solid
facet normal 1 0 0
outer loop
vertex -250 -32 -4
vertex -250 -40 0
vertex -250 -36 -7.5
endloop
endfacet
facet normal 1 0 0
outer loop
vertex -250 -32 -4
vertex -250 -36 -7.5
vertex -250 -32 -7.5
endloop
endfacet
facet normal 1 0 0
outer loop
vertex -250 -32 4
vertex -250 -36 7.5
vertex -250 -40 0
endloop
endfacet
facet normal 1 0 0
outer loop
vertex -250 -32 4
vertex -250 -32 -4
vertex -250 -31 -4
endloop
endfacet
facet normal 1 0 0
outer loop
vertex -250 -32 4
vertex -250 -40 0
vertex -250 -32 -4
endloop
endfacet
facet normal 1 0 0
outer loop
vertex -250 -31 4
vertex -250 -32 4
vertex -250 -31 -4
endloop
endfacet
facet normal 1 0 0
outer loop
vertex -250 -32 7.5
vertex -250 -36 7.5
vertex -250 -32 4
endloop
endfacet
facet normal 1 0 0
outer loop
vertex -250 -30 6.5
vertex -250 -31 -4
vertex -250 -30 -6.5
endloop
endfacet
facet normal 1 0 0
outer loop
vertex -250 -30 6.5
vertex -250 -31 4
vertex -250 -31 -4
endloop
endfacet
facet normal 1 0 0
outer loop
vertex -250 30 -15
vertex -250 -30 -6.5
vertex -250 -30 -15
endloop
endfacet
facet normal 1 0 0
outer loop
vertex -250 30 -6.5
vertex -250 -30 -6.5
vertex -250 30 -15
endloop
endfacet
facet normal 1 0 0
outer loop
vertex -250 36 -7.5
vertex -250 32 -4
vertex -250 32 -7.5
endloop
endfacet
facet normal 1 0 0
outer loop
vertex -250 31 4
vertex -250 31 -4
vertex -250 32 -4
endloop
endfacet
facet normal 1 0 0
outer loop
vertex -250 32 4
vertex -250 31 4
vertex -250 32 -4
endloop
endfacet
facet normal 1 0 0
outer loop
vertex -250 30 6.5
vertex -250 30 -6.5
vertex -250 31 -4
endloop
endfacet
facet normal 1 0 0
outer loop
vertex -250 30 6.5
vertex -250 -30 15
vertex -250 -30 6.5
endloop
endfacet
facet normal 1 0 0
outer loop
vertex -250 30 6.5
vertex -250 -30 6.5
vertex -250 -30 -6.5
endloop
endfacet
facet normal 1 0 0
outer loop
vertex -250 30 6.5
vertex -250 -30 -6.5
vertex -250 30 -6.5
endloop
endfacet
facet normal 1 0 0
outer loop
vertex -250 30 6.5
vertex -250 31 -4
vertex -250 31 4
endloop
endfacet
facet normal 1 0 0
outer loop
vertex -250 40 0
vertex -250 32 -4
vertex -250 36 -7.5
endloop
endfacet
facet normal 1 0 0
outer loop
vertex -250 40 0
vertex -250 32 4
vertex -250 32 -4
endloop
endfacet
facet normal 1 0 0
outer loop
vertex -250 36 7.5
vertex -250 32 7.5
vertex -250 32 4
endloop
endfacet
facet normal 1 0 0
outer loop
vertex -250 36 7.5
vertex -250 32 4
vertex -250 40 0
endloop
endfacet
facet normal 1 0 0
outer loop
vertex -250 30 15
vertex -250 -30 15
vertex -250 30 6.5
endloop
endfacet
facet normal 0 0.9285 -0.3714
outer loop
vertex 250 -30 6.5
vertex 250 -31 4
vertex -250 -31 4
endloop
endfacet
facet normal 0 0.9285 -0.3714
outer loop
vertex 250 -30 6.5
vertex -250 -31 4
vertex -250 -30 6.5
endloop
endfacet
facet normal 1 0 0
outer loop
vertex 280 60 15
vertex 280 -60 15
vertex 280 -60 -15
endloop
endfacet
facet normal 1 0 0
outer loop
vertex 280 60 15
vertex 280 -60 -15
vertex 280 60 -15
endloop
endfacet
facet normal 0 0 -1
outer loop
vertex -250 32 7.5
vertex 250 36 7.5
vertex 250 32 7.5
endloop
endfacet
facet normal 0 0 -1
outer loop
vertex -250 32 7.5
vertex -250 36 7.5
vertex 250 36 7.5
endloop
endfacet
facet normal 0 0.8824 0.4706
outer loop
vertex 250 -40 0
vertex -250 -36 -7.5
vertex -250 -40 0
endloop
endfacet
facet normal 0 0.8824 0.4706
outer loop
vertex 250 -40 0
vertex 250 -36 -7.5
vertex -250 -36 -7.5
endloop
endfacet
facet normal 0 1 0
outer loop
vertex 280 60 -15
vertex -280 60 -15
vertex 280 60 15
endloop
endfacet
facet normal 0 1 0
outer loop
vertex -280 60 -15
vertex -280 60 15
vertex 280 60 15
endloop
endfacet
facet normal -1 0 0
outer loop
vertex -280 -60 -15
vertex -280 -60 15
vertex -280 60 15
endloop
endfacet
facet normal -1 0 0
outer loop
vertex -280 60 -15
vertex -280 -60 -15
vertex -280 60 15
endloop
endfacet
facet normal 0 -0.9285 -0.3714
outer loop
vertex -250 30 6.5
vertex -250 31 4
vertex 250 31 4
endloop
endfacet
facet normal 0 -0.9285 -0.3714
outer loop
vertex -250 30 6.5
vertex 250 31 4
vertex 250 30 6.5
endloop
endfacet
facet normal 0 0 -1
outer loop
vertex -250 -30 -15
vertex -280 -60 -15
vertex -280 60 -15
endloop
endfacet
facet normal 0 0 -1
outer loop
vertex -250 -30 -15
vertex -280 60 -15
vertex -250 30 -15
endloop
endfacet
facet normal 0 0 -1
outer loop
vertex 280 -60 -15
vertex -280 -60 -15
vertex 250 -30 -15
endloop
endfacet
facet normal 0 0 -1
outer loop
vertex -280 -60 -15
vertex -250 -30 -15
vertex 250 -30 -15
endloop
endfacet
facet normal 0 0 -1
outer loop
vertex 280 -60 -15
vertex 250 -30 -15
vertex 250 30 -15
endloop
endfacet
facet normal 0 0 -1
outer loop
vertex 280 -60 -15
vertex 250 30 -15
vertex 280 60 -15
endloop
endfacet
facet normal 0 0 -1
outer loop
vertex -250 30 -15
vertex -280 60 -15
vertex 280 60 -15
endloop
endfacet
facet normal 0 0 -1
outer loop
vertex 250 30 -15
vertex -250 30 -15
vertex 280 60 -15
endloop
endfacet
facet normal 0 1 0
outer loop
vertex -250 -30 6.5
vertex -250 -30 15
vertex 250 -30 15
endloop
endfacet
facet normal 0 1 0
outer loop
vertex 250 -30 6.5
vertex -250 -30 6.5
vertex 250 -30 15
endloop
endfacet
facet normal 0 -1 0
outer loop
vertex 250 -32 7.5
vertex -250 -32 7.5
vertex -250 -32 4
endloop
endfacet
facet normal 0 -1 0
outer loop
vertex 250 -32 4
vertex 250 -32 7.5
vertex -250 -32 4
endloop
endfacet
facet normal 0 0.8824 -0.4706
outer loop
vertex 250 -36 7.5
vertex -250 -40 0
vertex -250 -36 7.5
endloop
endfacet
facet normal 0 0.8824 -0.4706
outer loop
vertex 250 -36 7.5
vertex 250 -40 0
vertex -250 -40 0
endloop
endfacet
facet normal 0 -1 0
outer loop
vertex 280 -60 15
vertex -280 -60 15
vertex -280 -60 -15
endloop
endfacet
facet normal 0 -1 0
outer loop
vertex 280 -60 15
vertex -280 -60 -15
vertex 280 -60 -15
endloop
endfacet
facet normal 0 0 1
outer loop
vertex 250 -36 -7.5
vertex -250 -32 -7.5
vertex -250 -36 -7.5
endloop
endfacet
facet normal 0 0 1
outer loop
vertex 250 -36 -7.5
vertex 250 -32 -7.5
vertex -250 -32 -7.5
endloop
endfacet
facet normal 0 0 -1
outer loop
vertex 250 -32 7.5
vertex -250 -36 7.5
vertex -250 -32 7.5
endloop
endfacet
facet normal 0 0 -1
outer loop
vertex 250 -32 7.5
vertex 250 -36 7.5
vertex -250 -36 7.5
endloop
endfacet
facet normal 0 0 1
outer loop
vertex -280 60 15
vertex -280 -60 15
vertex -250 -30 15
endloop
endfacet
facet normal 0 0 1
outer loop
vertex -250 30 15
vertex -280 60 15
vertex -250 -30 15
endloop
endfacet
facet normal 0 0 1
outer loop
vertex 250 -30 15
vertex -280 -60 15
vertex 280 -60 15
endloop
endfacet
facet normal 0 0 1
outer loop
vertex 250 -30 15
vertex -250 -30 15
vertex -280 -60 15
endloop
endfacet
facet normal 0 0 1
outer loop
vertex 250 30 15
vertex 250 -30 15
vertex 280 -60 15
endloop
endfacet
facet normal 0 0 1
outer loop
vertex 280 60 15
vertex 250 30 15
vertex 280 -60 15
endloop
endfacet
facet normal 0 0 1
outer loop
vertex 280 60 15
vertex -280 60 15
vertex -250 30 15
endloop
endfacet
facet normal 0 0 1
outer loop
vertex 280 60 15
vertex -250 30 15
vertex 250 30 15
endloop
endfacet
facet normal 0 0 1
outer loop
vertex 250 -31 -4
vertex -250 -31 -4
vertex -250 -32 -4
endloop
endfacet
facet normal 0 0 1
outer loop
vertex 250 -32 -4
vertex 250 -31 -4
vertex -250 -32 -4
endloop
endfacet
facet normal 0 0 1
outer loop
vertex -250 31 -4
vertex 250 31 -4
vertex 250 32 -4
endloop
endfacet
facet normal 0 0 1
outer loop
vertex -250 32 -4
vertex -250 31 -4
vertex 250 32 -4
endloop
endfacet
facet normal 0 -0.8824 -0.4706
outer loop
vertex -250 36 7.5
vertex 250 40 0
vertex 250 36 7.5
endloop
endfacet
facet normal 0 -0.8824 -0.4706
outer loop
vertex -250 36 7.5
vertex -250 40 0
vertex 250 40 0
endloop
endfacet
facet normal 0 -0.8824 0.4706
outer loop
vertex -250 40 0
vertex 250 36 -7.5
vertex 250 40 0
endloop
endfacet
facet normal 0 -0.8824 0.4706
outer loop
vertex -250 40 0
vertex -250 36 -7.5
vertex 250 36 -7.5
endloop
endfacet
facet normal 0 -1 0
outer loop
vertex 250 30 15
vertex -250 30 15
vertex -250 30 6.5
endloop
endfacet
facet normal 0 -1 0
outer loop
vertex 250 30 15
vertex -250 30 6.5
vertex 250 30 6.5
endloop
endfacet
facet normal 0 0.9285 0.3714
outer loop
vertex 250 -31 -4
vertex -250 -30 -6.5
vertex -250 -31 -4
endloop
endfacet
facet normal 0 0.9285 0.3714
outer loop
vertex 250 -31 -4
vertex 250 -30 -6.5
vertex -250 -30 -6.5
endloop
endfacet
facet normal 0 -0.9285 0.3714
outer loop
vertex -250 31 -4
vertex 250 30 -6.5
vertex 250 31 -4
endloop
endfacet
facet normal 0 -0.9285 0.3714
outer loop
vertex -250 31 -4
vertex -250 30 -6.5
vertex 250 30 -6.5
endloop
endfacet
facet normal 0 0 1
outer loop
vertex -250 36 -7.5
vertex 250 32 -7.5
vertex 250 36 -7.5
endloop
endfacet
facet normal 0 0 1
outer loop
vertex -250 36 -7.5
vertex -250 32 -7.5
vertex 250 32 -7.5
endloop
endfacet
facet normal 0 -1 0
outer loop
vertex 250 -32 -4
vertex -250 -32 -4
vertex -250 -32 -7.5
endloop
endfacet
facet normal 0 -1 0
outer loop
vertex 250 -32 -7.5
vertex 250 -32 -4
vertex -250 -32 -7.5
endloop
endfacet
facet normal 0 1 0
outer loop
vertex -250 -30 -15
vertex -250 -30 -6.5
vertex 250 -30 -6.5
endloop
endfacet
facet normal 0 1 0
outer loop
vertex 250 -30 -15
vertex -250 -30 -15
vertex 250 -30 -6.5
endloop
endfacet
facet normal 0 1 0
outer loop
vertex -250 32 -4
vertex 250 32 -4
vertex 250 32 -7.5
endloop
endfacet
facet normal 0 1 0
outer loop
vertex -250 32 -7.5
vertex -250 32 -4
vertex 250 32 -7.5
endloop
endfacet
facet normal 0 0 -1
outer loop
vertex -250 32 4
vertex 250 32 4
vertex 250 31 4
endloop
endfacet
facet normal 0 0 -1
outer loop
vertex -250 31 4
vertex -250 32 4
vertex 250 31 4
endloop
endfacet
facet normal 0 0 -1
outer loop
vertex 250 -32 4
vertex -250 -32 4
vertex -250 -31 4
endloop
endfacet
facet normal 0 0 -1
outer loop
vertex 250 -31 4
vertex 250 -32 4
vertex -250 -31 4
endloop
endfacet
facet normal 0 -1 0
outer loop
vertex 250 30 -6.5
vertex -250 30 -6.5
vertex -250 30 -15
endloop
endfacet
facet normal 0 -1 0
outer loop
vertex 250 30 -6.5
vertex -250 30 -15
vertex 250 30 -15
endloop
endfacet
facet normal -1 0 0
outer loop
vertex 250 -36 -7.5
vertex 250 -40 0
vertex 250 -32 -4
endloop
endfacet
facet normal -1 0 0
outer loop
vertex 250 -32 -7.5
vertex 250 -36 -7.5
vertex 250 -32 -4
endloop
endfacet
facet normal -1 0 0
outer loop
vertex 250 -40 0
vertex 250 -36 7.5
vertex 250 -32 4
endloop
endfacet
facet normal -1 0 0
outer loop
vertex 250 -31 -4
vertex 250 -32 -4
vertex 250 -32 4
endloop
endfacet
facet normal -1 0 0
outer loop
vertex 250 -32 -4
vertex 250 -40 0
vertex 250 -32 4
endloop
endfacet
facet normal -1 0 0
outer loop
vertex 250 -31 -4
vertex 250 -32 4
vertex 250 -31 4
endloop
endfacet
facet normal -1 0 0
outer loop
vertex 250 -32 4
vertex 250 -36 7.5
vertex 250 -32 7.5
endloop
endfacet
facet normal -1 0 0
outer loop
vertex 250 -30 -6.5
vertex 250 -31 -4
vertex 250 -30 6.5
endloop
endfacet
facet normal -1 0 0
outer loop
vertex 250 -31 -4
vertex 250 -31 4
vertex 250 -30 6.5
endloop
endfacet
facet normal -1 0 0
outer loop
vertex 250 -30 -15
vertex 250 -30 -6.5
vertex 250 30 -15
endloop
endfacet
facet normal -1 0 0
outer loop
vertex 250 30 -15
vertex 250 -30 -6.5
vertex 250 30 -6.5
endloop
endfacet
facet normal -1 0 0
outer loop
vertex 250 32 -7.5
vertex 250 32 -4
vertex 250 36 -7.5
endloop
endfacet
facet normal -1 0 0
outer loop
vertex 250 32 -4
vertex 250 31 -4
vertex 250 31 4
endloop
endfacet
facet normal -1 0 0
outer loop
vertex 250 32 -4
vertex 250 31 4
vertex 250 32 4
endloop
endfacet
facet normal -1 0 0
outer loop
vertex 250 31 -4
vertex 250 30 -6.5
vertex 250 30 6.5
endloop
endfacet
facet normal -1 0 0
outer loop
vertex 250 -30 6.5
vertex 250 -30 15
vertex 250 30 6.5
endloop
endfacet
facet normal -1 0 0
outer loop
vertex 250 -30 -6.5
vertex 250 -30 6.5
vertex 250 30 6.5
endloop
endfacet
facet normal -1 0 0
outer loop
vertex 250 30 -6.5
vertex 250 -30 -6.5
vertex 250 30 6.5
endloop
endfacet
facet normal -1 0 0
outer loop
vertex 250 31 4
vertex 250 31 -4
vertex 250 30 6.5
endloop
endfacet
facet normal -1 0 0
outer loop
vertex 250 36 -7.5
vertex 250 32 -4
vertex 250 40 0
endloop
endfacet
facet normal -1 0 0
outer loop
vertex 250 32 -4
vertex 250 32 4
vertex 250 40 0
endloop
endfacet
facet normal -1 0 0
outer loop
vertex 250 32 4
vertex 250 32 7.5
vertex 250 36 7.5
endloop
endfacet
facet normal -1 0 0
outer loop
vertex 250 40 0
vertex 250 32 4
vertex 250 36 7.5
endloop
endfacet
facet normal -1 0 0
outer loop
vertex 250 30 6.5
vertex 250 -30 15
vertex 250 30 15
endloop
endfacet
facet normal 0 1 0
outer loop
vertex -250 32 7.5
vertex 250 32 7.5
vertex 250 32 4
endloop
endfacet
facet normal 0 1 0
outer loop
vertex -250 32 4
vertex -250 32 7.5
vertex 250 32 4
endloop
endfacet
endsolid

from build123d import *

# Parameters (mm, degrees)
SKETCH1_W           = 560
SKETCH1_H           = 120
SKETCH1_W_2         = 500
SKETCH1_H_2         = 60
BOSS_EXTRUDE1_DEPTH = 15
CUT_EXTRUDE1_DEPTH  = 250


with BuildPart() as part:
    # Sketch1 → Boss-Extrude1 (new, symmetric)
    with BuildSketch(Plane.XY):
        Rectangle(SKETCH1_W, SKETCH1_H)
        Rectangle(SKETCH1_W_2, SKETCH1_H_2, mode=Mode.SUBTRACT)
    extrude(amount=BOSS_EXTRUDE1_DEPTH, both=True)

    # Sketch2 → Cut-Extrude1 (cut, symmetric)
    with BuildSketch(Plane(origin=(0, 0, 0), x_dir=(0, 0, -1), z_dir=(1, 0, 0))):
        Polygon((-4, 31), (-6.5, 30), (6.5, 30), (4, 31), (4, 32), (7.5, 32), (7.5, 36), (0, 40), (-7.5, 36), (-7.5, 32), (-4, 32), align=None)
        Polygon((-6.5, -30), (6.5, -30), (4, -31), (4, -32), (7.5, -32), (7.5, -36), (0, -40), (-7.5, -36), (-7.5, -32), (-4, -32), (-4, -31), align=None)
    extrude(amount=CUT_EXTRUDE1_DEPTH, both=True, mode=Mode.SUBTRACT)


solid = part.part
